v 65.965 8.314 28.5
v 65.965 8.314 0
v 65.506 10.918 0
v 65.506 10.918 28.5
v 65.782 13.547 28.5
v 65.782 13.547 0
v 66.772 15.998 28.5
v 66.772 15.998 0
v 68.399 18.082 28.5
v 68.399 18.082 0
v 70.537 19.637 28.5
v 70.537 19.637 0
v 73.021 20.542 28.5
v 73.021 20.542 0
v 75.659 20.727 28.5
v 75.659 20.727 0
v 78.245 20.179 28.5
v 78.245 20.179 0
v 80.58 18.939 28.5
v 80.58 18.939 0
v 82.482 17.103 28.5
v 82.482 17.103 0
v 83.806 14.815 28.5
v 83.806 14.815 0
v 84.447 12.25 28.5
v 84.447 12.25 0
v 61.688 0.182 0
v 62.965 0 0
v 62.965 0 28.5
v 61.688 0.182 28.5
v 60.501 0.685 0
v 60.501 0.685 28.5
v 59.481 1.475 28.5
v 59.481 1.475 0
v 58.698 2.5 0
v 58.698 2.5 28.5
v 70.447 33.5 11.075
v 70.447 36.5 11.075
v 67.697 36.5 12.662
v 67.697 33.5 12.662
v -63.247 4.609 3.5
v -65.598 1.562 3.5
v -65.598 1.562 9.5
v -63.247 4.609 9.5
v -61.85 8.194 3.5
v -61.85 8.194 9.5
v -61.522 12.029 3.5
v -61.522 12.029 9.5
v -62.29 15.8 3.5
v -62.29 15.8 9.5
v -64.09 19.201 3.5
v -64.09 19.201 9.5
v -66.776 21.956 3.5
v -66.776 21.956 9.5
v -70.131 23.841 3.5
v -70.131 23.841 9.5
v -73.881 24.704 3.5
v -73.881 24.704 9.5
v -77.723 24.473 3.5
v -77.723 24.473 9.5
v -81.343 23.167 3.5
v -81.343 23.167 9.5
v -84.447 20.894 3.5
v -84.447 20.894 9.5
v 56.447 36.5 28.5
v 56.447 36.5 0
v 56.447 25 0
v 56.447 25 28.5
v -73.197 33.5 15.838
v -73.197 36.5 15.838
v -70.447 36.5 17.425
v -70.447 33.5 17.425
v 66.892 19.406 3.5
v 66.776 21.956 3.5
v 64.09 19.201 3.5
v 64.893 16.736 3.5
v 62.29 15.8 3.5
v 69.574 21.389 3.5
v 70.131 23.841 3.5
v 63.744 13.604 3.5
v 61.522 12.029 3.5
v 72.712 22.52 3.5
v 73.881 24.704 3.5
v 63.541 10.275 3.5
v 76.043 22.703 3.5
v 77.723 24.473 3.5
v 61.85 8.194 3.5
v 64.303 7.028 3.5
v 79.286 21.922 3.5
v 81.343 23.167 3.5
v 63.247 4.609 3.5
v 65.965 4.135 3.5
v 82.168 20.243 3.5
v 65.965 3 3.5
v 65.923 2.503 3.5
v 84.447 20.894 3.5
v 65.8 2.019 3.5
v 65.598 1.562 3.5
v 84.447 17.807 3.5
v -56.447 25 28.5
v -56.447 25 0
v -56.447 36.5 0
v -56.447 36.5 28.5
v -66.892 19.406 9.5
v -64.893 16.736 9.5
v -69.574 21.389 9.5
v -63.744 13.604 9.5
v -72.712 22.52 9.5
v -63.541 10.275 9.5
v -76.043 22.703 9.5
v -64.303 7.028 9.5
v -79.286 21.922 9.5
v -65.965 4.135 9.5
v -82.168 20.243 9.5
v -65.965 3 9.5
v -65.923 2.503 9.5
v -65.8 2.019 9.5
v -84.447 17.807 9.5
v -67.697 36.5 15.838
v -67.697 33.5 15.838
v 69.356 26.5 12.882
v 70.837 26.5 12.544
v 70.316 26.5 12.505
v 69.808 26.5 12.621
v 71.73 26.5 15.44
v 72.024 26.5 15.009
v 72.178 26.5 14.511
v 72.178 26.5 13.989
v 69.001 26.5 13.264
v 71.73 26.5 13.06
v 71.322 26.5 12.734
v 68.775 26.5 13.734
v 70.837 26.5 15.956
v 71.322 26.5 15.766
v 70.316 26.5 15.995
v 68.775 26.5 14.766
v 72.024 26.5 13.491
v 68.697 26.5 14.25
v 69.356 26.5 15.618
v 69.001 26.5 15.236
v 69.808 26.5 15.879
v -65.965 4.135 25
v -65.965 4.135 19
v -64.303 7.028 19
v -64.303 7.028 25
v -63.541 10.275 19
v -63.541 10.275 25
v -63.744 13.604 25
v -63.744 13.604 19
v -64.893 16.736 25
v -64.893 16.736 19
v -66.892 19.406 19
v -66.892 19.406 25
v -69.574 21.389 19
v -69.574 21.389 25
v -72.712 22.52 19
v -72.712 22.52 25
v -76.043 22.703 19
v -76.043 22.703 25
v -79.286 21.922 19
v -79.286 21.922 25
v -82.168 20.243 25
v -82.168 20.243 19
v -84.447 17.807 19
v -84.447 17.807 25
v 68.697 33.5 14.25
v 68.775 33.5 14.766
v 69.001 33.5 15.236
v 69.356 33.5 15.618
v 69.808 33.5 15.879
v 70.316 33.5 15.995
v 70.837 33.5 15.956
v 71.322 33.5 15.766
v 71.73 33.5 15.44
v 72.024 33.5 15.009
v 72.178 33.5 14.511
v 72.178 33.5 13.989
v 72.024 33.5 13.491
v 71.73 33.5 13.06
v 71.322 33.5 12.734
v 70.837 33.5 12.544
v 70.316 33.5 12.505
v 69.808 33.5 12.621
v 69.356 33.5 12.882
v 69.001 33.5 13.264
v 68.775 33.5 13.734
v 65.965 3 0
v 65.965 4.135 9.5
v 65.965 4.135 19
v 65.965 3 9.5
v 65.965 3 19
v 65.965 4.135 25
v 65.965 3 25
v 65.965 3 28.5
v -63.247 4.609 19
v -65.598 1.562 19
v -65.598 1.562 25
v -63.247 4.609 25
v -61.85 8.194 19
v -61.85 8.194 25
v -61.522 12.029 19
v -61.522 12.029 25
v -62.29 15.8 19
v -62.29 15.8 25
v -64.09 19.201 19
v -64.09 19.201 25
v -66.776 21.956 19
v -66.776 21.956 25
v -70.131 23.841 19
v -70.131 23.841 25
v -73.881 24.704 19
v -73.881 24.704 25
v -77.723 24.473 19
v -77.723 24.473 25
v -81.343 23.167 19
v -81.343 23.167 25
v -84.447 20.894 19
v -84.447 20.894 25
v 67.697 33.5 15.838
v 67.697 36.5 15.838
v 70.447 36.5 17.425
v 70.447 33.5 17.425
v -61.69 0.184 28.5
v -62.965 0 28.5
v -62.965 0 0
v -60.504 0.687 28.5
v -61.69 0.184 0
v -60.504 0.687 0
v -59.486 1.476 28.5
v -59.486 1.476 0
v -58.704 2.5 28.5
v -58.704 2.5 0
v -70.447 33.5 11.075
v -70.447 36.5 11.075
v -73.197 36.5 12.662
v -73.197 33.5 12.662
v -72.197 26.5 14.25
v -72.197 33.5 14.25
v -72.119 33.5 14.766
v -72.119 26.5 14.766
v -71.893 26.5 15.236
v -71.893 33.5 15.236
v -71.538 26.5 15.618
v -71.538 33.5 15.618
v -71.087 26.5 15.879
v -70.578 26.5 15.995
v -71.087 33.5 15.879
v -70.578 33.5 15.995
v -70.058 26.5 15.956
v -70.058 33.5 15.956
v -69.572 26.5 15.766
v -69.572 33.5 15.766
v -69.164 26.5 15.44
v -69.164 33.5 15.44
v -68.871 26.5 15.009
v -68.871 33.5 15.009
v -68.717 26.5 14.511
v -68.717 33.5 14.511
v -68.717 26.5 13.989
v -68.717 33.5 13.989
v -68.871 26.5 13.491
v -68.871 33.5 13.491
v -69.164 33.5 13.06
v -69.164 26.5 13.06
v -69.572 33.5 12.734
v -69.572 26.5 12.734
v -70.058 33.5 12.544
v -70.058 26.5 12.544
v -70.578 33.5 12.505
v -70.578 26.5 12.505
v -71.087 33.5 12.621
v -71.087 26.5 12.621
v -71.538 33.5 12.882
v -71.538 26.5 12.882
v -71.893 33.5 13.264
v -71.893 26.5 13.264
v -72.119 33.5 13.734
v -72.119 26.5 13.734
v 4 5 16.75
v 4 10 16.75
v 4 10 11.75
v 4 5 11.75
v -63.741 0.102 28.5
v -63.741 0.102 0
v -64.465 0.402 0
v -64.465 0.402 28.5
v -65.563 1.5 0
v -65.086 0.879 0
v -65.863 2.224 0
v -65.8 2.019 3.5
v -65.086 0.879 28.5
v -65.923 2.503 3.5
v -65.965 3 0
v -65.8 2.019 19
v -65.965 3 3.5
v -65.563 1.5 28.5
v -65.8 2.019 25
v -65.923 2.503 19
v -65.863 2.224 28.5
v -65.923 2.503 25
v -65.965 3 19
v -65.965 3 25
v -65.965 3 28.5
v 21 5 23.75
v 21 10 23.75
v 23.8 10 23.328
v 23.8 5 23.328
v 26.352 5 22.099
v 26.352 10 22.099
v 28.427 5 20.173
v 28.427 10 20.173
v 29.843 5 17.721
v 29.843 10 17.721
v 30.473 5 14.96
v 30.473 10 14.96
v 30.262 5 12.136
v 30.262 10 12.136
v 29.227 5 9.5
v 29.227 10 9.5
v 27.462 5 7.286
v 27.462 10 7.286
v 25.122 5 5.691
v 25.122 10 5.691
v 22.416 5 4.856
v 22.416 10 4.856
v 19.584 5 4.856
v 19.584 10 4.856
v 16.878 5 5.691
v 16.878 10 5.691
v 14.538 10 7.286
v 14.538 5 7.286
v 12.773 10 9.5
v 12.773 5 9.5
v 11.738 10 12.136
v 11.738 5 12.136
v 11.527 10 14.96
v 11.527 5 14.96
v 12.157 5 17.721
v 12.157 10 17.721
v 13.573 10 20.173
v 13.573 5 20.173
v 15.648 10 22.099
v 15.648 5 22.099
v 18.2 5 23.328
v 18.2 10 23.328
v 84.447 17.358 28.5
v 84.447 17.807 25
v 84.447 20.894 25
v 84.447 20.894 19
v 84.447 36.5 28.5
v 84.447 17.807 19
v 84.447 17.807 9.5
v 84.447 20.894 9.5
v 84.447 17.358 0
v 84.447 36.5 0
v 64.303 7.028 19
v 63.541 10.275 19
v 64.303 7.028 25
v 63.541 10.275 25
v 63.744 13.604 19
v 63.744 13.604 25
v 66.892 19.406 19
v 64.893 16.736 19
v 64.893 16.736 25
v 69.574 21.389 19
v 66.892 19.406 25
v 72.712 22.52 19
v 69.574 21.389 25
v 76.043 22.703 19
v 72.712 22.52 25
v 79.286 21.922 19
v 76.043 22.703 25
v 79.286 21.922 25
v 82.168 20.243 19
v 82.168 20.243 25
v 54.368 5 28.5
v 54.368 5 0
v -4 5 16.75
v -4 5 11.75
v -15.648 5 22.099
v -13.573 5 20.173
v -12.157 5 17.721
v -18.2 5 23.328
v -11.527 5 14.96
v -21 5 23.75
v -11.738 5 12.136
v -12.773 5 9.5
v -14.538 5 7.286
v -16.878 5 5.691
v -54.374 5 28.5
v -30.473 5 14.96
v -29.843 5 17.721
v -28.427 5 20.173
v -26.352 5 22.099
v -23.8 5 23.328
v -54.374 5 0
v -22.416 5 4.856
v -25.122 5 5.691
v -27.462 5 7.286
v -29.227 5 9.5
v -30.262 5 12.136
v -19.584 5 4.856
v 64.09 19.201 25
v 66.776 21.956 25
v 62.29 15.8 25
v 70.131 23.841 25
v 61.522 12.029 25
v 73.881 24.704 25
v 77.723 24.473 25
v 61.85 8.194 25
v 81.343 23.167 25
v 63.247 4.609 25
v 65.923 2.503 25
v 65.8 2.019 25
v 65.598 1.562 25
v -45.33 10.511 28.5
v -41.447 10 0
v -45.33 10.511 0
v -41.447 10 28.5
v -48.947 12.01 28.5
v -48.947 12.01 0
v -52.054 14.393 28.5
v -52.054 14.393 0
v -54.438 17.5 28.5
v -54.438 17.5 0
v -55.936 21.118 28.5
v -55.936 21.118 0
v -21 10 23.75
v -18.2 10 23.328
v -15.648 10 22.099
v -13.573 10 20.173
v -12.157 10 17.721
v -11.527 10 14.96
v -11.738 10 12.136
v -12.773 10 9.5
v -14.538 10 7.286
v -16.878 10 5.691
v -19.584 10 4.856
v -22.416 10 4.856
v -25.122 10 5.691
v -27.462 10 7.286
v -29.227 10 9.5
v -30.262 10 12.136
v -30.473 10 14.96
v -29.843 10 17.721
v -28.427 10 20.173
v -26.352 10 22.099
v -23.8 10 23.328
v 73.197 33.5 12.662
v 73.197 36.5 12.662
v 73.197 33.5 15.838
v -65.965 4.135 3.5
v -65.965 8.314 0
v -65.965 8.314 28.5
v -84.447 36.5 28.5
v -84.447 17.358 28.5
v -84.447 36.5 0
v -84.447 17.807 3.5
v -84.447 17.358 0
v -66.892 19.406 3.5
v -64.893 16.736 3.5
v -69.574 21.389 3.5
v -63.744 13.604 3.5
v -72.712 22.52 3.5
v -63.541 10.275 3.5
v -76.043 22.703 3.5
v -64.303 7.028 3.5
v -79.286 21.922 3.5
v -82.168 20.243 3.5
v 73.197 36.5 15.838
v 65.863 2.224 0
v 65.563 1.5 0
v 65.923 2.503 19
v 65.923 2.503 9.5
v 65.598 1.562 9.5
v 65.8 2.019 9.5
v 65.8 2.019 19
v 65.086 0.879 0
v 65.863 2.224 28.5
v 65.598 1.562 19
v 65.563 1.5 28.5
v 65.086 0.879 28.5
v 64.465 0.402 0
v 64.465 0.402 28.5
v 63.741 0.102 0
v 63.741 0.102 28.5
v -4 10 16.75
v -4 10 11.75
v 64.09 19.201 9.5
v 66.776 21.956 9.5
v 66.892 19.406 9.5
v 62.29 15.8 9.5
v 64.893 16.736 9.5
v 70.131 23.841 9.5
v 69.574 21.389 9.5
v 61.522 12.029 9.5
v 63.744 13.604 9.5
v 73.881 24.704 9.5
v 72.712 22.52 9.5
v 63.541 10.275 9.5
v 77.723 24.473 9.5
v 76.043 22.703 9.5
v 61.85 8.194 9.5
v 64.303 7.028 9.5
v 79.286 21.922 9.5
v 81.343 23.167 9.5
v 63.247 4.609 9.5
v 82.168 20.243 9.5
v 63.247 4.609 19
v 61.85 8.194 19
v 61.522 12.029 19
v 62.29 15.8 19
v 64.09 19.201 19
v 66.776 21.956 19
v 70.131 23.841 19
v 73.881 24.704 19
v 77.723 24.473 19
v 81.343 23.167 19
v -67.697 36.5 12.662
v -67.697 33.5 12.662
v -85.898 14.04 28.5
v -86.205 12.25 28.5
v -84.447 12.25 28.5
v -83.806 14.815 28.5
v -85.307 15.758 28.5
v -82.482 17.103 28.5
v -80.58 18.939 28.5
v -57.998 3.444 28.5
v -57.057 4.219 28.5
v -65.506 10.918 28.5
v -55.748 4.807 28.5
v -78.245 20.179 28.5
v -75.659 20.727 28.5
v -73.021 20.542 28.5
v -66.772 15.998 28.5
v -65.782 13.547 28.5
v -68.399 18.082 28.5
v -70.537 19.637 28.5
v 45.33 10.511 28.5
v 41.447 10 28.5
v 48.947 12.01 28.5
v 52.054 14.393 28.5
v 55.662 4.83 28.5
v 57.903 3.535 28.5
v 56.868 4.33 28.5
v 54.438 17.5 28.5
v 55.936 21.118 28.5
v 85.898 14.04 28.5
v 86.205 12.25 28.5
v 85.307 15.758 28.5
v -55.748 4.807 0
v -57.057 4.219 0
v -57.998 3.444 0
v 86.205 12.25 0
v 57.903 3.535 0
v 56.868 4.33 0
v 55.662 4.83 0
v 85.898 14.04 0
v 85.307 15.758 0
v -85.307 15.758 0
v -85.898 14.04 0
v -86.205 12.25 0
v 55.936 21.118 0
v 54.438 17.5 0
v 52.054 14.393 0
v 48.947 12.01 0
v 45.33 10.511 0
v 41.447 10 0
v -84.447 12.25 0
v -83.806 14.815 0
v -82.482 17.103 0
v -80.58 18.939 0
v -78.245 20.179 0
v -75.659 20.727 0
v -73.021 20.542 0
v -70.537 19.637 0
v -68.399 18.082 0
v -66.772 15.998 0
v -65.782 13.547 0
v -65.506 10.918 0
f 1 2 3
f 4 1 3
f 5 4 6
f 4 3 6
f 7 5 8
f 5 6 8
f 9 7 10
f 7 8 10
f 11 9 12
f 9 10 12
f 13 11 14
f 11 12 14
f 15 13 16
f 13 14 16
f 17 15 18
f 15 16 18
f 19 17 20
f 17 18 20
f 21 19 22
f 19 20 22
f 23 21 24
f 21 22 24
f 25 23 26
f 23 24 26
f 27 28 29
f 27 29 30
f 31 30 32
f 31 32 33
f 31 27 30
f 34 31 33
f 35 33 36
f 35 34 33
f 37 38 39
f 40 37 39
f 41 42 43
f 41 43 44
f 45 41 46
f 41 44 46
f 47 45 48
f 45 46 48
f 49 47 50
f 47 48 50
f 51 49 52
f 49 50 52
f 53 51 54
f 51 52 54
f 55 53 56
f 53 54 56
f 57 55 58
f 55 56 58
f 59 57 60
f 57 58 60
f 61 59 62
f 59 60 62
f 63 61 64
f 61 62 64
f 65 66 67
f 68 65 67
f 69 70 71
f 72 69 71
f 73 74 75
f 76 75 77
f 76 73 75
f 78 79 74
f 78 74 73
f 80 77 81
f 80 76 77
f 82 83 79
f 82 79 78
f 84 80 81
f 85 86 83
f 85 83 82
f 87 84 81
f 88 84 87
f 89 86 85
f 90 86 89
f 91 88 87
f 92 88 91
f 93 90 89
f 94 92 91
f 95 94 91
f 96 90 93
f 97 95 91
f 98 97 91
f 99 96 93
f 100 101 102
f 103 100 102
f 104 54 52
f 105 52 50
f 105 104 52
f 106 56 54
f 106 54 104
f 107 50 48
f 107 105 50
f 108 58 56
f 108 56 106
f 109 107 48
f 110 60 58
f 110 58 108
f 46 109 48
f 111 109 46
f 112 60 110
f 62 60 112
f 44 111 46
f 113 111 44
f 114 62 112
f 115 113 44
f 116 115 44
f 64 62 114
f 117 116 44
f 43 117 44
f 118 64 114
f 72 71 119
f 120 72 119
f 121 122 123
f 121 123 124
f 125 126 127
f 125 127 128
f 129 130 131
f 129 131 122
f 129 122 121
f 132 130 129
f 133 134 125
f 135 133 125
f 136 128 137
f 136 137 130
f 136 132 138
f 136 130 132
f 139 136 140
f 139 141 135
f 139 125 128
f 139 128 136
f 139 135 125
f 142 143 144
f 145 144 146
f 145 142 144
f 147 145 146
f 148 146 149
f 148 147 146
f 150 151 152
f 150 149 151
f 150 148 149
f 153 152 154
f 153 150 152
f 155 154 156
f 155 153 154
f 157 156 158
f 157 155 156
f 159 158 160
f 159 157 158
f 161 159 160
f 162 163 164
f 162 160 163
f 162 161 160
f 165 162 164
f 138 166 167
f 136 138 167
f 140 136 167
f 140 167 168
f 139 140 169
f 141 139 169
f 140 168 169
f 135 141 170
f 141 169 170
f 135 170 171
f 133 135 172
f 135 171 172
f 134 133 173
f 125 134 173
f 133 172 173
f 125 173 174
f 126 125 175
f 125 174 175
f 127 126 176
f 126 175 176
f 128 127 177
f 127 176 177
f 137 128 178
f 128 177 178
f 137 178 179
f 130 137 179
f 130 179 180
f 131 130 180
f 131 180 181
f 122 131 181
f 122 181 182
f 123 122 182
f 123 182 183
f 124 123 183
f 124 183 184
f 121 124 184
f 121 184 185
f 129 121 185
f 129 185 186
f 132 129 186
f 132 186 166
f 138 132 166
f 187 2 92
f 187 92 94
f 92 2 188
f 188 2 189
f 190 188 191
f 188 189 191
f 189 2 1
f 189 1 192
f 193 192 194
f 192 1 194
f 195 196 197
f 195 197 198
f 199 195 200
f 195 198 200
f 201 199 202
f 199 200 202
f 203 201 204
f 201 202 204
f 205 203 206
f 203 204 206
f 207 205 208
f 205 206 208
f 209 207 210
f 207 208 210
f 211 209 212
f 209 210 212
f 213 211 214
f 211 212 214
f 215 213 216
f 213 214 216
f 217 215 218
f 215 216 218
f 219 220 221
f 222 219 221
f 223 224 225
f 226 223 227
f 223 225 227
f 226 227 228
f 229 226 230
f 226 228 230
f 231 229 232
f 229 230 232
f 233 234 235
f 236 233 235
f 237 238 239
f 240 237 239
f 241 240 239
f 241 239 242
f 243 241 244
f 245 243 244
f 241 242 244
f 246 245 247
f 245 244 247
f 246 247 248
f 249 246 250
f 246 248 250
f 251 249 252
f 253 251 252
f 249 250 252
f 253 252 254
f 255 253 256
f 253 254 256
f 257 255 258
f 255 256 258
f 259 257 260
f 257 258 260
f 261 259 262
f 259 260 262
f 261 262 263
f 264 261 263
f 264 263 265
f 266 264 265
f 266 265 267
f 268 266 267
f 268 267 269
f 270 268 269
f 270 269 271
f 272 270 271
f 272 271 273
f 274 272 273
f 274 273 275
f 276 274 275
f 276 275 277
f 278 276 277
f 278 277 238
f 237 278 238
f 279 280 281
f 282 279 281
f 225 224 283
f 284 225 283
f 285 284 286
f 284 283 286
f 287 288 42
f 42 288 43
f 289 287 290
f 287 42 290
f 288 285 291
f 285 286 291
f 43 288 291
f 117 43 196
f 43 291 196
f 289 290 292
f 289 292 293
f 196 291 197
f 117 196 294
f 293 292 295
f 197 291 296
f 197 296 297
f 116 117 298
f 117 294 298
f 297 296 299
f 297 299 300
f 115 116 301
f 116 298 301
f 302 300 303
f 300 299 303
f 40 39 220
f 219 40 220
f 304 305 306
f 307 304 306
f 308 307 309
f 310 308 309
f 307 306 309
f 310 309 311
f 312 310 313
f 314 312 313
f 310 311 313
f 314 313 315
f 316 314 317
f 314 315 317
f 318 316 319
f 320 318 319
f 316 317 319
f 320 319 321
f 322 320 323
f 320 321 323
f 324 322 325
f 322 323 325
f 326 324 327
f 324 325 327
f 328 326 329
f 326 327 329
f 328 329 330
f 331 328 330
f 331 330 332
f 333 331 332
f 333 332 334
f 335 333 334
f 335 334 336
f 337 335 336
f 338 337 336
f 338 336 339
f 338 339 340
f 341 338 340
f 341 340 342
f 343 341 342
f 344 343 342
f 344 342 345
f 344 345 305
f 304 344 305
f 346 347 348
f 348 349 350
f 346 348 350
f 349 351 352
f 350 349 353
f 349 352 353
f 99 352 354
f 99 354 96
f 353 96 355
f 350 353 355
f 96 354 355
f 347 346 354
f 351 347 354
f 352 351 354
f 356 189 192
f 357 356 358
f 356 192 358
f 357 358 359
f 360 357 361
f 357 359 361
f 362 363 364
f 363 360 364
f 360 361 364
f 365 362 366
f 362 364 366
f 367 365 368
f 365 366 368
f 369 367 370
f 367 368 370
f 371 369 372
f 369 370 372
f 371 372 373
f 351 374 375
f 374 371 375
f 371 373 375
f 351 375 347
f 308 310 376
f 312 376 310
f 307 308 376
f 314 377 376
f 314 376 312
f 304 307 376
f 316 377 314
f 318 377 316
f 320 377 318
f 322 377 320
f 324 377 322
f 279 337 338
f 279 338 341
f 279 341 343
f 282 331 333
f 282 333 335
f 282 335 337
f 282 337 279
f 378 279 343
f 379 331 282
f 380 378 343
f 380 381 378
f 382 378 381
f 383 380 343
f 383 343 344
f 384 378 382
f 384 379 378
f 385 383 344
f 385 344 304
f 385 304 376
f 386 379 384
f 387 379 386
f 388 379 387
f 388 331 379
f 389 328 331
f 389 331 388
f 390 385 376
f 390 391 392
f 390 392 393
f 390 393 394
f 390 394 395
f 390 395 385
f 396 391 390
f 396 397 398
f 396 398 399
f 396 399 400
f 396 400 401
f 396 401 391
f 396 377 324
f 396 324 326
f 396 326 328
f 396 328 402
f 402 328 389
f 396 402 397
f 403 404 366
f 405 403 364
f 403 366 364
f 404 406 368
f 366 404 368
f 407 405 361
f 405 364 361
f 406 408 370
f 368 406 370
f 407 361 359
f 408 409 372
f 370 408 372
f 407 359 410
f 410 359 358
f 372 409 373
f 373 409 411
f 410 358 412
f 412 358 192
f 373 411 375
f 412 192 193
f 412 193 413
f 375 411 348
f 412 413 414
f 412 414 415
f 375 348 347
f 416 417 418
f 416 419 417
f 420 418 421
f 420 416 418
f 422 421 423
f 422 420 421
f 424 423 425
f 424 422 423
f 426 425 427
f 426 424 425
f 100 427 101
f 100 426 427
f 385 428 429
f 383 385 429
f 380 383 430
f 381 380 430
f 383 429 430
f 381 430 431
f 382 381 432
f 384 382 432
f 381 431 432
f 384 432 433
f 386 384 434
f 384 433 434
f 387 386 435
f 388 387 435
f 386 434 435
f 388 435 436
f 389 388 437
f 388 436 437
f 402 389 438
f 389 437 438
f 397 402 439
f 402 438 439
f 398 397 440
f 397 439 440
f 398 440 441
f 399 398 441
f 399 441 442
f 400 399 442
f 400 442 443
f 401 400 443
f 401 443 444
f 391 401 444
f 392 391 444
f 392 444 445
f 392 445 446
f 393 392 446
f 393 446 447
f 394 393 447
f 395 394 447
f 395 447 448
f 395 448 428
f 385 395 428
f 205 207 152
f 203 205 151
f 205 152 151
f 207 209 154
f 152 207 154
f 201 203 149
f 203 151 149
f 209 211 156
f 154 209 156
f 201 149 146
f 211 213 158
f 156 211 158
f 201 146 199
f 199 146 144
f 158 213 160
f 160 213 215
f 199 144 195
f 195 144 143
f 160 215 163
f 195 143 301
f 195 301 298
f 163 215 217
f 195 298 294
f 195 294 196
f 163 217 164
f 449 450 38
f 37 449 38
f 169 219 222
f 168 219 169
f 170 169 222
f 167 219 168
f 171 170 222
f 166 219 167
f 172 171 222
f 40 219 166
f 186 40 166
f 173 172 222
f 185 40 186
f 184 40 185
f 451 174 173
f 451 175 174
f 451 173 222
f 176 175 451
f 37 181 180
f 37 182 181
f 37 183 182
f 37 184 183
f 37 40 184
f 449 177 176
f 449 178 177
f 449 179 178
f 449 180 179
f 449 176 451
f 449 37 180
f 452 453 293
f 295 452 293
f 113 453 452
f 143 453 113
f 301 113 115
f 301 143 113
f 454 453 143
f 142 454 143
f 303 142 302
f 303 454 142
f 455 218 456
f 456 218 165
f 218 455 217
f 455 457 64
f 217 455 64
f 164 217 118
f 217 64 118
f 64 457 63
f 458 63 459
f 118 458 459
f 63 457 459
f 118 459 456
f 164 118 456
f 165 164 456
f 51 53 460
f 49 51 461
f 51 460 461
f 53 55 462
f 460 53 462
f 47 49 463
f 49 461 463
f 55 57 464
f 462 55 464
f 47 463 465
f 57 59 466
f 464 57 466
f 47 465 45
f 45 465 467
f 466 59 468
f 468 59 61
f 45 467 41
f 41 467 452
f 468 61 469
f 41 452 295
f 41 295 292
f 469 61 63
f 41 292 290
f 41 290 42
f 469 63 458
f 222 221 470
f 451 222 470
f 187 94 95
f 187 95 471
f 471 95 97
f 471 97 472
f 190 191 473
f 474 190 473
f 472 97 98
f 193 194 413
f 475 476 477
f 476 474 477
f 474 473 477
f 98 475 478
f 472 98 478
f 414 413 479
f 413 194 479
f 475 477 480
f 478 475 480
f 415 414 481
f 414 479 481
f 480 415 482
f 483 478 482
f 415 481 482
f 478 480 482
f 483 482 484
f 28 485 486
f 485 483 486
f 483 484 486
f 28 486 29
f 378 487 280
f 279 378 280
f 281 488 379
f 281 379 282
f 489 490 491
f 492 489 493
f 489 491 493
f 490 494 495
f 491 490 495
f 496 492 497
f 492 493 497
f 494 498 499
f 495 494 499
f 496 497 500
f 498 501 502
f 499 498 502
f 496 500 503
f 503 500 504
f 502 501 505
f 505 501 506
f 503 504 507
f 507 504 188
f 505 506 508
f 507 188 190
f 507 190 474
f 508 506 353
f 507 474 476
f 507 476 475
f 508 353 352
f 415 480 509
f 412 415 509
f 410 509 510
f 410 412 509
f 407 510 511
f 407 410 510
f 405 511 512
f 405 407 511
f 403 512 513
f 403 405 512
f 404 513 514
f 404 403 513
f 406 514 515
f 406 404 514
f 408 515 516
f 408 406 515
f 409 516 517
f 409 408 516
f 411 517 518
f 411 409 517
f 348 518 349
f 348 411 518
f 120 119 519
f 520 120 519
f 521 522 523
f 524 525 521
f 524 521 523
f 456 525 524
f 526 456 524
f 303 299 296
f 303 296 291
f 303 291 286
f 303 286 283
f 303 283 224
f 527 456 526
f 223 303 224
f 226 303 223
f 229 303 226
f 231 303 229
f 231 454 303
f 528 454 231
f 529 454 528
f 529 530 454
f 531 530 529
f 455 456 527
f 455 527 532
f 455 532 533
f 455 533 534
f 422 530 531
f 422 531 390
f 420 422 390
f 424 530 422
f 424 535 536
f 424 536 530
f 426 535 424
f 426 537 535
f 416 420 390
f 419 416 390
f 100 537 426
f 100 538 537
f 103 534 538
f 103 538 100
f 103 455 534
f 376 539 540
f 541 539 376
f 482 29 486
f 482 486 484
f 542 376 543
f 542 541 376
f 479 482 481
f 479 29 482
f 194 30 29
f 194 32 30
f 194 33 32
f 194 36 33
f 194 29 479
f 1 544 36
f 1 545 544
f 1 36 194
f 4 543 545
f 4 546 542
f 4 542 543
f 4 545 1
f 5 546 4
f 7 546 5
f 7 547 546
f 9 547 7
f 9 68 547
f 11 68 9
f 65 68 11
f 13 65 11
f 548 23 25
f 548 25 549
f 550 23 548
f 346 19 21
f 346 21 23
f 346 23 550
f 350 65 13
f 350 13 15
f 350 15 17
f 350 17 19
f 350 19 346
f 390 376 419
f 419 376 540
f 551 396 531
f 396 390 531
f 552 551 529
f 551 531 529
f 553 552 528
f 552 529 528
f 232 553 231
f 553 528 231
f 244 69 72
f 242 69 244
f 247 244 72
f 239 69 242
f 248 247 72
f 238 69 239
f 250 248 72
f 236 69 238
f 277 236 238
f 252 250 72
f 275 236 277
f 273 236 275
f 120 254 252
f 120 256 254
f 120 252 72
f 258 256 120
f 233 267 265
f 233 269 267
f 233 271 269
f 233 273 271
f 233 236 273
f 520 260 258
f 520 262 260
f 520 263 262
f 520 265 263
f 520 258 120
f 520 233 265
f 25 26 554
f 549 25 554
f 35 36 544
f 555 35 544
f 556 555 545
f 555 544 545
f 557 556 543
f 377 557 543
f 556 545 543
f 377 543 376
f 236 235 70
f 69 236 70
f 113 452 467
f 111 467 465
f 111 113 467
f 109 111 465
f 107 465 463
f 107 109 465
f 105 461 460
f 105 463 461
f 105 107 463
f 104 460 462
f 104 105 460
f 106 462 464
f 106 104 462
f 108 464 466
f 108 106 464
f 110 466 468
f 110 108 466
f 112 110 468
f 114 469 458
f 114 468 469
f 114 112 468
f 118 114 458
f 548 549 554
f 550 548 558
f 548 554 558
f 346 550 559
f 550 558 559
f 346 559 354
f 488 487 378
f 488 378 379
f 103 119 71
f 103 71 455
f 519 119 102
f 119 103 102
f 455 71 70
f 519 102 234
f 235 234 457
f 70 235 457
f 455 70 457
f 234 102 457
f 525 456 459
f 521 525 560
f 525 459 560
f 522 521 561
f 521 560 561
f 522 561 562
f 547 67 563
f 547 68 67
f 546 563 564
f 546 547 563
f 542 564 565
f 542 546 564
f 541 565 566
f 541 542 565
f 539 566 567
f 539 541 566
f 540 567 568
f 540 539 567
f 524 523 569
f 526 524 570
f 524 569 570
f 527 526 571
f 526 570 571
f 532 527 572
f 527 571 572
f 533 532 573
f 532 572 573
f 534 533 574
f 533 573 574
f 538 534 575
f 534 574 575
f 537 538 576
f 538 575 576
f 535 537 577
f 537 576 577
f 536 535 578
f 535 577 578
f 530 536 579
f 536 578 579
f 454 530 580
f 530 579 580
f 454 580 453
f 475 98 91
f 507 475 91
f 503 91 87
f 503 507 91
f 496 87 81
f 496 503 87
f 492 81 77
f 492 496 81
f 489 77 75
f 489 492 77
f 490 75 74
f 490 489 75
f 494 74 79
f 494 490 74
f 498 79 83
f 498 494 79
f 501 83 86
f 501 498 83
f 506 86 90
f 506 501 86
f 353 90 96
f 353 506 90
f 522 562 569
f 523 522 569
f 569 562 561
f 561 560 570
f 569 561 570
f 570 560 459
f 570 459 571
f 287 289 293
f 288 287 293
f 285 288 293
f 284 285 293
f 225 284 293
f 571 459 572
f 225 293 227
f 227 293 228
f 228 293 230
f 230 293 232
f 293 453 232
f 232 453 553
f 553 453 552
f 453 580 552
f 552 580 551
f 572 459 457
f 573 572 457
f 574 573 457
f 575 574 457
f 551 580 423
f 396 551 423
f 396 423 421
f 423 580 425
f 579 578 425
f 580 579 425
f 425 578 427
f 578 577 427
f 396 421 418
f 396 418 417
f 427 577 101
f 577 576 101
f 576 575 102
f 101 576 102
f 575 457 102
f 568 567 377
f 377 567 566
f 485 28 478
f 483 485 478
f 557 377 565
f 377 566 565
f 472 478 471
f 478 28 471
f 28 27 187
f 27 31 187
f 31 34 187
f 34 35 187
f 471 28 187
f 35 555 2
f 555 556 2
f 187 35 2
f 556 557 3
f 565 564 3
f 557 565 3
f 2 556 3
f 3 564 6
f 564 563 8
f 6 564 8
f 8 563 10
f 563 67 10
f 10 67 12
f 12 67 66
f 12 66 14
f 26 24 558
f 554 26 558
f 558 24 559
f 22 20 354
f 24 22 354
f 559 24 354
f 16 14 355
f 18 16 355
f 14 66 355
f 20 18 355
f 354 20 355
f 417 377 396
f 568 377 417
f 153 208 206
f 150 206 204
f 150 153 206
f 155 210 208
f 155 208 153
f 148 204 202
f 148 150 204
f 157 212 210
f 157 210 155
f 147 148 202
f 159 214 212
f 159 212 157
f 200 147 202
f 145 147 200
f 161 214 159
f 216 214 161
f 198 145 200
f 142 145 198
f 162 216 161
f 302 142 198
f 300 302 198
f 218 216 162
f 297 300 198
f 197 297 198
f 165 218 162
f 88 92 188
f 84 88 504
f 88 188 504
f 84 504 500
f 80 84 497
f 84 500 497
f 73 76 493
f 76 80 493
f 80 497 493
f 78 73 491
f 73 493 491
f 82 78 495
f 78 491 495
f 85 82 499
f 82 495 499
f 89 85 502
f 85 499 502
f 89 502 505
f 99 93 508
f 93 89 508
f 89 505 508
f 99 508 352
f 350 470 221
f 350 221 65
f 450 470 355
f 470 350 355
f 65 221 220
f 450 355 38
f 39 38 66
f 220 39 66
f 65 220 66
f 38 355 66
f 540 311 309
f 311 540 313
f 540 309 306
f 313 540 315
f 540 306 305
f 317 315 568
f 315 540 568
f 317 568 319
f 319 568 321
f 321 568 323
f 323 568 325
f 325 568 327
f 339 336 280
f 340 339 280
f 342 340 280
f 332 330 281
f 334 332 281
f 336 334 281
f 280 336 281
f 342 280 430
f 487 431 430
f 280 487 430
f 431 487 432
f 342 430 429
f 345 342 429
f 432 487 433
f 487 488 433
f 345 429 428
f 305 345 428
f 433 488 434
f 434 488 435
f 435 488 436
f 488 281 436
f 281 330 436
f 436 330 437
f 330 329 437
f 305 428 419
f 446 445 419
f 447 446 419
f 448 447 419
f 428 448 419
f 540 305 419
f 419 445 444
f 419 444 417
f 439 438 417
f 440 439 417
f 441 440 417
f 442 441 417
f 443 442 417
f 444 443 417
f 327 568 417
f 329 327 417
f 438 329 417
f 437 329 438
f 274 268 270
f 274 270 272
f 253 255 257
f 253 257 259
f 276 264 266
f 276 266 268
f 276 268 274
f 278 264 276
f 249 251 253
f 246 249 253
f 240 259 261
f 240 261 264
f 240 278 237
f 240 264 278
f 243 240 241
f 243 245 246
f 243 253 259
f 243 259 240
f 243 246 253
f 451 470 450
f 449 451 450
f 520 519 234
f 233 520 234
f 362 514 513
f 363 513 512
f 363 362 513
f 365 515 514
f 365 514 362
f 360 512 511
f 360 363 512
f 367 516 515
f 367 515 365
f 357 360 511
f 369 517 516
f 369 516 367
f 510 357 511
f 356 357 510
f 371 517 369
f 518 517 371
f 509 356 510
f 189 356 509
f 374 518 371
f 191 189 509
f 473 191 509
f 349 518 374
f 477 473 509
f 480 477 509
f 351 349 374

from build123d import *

# Parameters (mm, degrees)
BOSS_EXTRUDE3_DEPTH = 28.5
FILLET1_R           = 15
SKETCH8_R           = 9.5
SKETCH8_W           = 8
SKETCH8_H           = 5
CUT_EXTRUDE4_DEPTH  = 10
SKETCH10_R          = 1.75
CUT_EXTRUDE6_DEPTH  = 10
CUT_EXTRUDE9_DEPTH  = 3
SKETCH17_W          = 6
SKETCH17_H          = 2
CUT_EXTRUDE11_DEPTH = 49
FILLET2_R           = 3
CUT_EXTRUDE12_START = -28.5
CUT_EXTRUDE12_DEPTH = 28.5
FILLET3_R           = 5
FILLET4_R           = 5
FILLET5_START       = -1
FILLET5_DEPTH       = 30


with BuildPart() as part:
    # Sketch7 → Boss-Extrude3 (new body)
    with BuildSketch(Plane.XY):
        with BuildLine():
            Line((-75, 0), (75, 0))
            ThreePointArc((75, 0), (82.593171274, 2.949021142), (86.205467416, 10.25))
            Line((86.205467416, 10.25), (84.447221814, 10.25))
            ThreePointArc((84.447221814, 10.25), (65.5, 11.25), (84.447221814, 12.25))
            Line((84.447221814, 12.25), (86.205467416, 12.25))
            ThreePointArc((86.205467416, 12.25), (85.637542957, 14.911308486), (84.447221814, 17.358395861))
            Line((84.447221814, 17.358395861), (84.447221814, 36.5))
            Line((84.447221814, 36.5), (56.447221814, 36.5))
            Line((56.447221814, 36.5), (56.447221814, 10))
            Line((56.447221814, 10), (-56.447221814, 10))
            Line((-56.447221814, 10), (-56.447221814, 36.5))
            Line((-56.447221814, 36.5), (-84.447221814, 36.5))
            Line((-84.447221814, 36.5), (-84.447221814, 17.358395861))
            ThreePointArc((-84.447221814, 17.358395861), (-85.637542957, 14.911308486), (-86.205467416, 12.25))
            Line((-86.205467416, 12.25), (-84.447221814, 12.25))
            ThreePointArc((-84.447221814, 12.25), (-65.5, 11.25), (-84.447221814, 10.25))
            Line((-84.447221814, 10.25), (-86.205467416, 10.25))
            ThreePointArc((-86.205467416, 10.25), (-82.593171274, 2.949021142), (-75, 0))
        make_face()
    extrude(amount=BOSS_EXTRUDE3_DEPTH)

    # Fillet1
    fillet1_edges = [part.edges().sort_by_distance(p)[0] for p in [
        (-56.447221814, 10, 14.25),
        (56.447221814, 10, 14.25),
    ]]
    fillet(fillet1_edges, radius=FILLET1_R)

    # Sketch8 → Cut-Extrude4 (cut)
    with BuildSketch(Plane(origin=(0, 10, 0), x_dir=(1, 0, 0), z_dir=(0, 1, 0))):
        with Locations(Location((21, -14.25, 0), (0, 0, 270))):
            Circle(SKETCH8_R)
        with Locations(Location((-21, -14.25, 0), (0, 0, 270))):
            Circle(SKETCH8_R)
        with Locations((0, -14.25)):
            Rectangle(SKETCH8_W, SKETCH8_H)
    extrude(amount=-CUT_EXTRUDE4_DEPTH, mode=Mode.SUBTRACT)

    # Sketch10 → Cut-Extrude6 (cut)
    with BuildSketch(Plane(origin=(0, 36.5, 0), x_dir=(1, 0, 0), z_dir=(0, 1, 0))):
        with Locations(Location((70.447221814, -14.25, 0), (0, 0, 180))):
            Circle(SKETCH10_R)
        with Locations(Location((-70.447221814, -14.25, 0), (0, 0, 180))):
            Circle(SKETCH10_R)
    extrude(amount=-CUT_EXTRUDE6_DEPTH, mode=Mode.SUBTRACT)

    # Sketch13 → Cut-Extrude9 (cut)
    with BuildSketch(Plane(origin=(0, 36.5, 0), x_dir=(1, 0, 0), z_dir=(0, 1, 0))):
        Polygon((67.697221814, -12.66228676), (67.697221814, -15.83771324), (70.447221814, -17.425426481), (73.197221814, -15.83771324), (73.197221814, -12.66228676), (70.447221814, -11.074573519), align=None)
        Polygon((-70.447221814, -17.425426481), (-67.697221814, -15.83771324), (-67.697221814, -12.66228676), (-70.447221814, -11.074573519), (-73.197221814, -12.66228676), (-73.197221814, -15.83771324), align=None)
    extrude(amount=-CUT_EXTRUDE9_DEPTH, mode=Mode.SUBTRACT)

    # Sketch17 → Cut-Revolve1 (revolve, cut)
    with BuildSketch(Plane.ZY.offset(-75)):
        with Locations((22, 23.75)):
            Rectangle(SKETCH17_W, SKETCH17_H)
        with Locations((6.5, 23.75)):
            Rectangle(SKETCH17_W, SKETCH17_H)
    cut_revolve1 = revolve(axis=Axis((75, 11.25, 28.5), (0, 0, -1)), mode=Mode.SUBTRACT)

    # Mirror1: Cut-Revolve1 across plane
    add(cut_revolve1.mirror(Plane(origin=(0, 0, 0), x_dir=(0, 0, 1), z_dir=(1, 0, 0))), mode=Mode.SUBTRACT)

    # Sketch18 → Cut-Extrude11 (cut)
    with BuildSketch(Plane.XY.offset(28.5)):
        Polygon((-75, 11.25), (-65.964963095, 8.314338553), (-65.964963095, 0), (-86.964963095, 0), (-86.964963095, 11.25), align=None)
        Polygon((86.964963095, 11.25), (75, 11.25), (65.964963095, 8.314338553), (65.964963095, 0), (86.964963095, 0), align=None)
    extrude(amount=-CUT_EXTRUDE11_DEPTH, mode=Mode.SUBTRACT)

    # Fillet2
    # the kernel refuses this fillet: 3 mm, written as the material it takes off along each edge
    with BuildSketch(Plane(origin=(-65.964963095, 0, 36), x_dir=(1, 0, 0), z_dir=(0, 0, -1)), Plane(origin=(65.964963095, 0, 36), x_dir=(0, 1, 0), z_dir=(0, 0, -1))) as fillet2_piece_1:
        with BuildLine():
            CenterArc((FILLET2_R, -FILLET2_R), FILLET2_R, 90, 90)
            Line((0, -FILLET2_R), (0, 0))
            Line((0, 0), (FILLET2_R, 0))
        make_face()
    extrude(amount=43.5, mode=Mode.SUBTRACT)

    # Sketch20 → Cut-Extrude12 (cut)
    with BuildSketch(Plane.XY.offset(28.5).offset(CUT_EXTRUDE12_START)):
        with BuildLine():
            Line((57.587719851, 5), (-57.587719851, 5))
            ThreePointArc((-57.587719851, 5), (-58.757162737, 2.39447982), (-60.313696857, 0))
            Line((-60.313696857, 0), (60.313696857, 0))
            ThreePointArc((60.313696857, 0), (58.757162737, 2.39447982), (57.587719851, 5))
        make_face()
    extrude(amount=CUT_EXTRUDE12_DEPTH, mode=Mode.SUBTRACT)

    # Fillet3
    # the kernel refuses this fillet: 5 mm, written as the material it takes off along each edge
    with BuildSketch(Plane(origin=(-60.313696857, 0, -7.959028746), x_dir=(0.5375468252695589, 0.8432339003162873, 0), z_dir=(0, 0, 1))) as fillet3_piece_1:
        with BuildLine():
            CenterArc((2.753393728, 4.981456882), FILLET3_R, 213.309669326, 61.62636665)
            Line((-1.425179749, 2.235637571), (-1.508751219, 2.180721184))
            ThreePointArc((-1.508751219, 2.180721184), (-0.796913265, 1.064064103), (-0.08432339, -0.053754683))
            Line((-0.08432339, -0.053754683), (-0.008604355, -0.099629138))
            ThreePointArc((-0.008604355, -0.099629138), (1.591805749, -0.168609535), (3.192215854, -0.099629138))
            Line((3.192215854, -0.099629138), (3.183611498, 0))
        make_face()
    extrude(amount=44.418057492, mode=Mode.SUBTRACT)

    # Fillet4
    fillet4_edges = [part.edges().sort_by_distance(p)[0] for p in [
        (-57.587719851, 5, 14.25),
        (57.587719851, 5, 14.25),
    ]]
    fillet(fillet4_edges, radius=FILLET4_R)

    # Fillet5: read off the stored shape, not the designer's step
    # Fillet5 outline → Fillet5 (cut)
    with BuildSketch(Plane.XY.offset(FILLET5_START)):
        with BuildLine():
            ThreePointArc((62.964963095, 0), (60.500818254, 0.685449294), (58.69804707, 2.499799478))
            ThreePointArc((58.69804707, 2.499799478), (58.728163344, 2.446889634), (58.757633161, 2.393617021))
            ThreePointArc((58.757633161, 2.393617021), (59.489422728, 1.16674692), (60.313696857, 0))
            Line((60.313696857, 0), (62.964963095, 0))
        make_face()
    extrude(amount=FILLET5_DEPTH, mode=Mode.SUBTRACT)


solid = part.part
